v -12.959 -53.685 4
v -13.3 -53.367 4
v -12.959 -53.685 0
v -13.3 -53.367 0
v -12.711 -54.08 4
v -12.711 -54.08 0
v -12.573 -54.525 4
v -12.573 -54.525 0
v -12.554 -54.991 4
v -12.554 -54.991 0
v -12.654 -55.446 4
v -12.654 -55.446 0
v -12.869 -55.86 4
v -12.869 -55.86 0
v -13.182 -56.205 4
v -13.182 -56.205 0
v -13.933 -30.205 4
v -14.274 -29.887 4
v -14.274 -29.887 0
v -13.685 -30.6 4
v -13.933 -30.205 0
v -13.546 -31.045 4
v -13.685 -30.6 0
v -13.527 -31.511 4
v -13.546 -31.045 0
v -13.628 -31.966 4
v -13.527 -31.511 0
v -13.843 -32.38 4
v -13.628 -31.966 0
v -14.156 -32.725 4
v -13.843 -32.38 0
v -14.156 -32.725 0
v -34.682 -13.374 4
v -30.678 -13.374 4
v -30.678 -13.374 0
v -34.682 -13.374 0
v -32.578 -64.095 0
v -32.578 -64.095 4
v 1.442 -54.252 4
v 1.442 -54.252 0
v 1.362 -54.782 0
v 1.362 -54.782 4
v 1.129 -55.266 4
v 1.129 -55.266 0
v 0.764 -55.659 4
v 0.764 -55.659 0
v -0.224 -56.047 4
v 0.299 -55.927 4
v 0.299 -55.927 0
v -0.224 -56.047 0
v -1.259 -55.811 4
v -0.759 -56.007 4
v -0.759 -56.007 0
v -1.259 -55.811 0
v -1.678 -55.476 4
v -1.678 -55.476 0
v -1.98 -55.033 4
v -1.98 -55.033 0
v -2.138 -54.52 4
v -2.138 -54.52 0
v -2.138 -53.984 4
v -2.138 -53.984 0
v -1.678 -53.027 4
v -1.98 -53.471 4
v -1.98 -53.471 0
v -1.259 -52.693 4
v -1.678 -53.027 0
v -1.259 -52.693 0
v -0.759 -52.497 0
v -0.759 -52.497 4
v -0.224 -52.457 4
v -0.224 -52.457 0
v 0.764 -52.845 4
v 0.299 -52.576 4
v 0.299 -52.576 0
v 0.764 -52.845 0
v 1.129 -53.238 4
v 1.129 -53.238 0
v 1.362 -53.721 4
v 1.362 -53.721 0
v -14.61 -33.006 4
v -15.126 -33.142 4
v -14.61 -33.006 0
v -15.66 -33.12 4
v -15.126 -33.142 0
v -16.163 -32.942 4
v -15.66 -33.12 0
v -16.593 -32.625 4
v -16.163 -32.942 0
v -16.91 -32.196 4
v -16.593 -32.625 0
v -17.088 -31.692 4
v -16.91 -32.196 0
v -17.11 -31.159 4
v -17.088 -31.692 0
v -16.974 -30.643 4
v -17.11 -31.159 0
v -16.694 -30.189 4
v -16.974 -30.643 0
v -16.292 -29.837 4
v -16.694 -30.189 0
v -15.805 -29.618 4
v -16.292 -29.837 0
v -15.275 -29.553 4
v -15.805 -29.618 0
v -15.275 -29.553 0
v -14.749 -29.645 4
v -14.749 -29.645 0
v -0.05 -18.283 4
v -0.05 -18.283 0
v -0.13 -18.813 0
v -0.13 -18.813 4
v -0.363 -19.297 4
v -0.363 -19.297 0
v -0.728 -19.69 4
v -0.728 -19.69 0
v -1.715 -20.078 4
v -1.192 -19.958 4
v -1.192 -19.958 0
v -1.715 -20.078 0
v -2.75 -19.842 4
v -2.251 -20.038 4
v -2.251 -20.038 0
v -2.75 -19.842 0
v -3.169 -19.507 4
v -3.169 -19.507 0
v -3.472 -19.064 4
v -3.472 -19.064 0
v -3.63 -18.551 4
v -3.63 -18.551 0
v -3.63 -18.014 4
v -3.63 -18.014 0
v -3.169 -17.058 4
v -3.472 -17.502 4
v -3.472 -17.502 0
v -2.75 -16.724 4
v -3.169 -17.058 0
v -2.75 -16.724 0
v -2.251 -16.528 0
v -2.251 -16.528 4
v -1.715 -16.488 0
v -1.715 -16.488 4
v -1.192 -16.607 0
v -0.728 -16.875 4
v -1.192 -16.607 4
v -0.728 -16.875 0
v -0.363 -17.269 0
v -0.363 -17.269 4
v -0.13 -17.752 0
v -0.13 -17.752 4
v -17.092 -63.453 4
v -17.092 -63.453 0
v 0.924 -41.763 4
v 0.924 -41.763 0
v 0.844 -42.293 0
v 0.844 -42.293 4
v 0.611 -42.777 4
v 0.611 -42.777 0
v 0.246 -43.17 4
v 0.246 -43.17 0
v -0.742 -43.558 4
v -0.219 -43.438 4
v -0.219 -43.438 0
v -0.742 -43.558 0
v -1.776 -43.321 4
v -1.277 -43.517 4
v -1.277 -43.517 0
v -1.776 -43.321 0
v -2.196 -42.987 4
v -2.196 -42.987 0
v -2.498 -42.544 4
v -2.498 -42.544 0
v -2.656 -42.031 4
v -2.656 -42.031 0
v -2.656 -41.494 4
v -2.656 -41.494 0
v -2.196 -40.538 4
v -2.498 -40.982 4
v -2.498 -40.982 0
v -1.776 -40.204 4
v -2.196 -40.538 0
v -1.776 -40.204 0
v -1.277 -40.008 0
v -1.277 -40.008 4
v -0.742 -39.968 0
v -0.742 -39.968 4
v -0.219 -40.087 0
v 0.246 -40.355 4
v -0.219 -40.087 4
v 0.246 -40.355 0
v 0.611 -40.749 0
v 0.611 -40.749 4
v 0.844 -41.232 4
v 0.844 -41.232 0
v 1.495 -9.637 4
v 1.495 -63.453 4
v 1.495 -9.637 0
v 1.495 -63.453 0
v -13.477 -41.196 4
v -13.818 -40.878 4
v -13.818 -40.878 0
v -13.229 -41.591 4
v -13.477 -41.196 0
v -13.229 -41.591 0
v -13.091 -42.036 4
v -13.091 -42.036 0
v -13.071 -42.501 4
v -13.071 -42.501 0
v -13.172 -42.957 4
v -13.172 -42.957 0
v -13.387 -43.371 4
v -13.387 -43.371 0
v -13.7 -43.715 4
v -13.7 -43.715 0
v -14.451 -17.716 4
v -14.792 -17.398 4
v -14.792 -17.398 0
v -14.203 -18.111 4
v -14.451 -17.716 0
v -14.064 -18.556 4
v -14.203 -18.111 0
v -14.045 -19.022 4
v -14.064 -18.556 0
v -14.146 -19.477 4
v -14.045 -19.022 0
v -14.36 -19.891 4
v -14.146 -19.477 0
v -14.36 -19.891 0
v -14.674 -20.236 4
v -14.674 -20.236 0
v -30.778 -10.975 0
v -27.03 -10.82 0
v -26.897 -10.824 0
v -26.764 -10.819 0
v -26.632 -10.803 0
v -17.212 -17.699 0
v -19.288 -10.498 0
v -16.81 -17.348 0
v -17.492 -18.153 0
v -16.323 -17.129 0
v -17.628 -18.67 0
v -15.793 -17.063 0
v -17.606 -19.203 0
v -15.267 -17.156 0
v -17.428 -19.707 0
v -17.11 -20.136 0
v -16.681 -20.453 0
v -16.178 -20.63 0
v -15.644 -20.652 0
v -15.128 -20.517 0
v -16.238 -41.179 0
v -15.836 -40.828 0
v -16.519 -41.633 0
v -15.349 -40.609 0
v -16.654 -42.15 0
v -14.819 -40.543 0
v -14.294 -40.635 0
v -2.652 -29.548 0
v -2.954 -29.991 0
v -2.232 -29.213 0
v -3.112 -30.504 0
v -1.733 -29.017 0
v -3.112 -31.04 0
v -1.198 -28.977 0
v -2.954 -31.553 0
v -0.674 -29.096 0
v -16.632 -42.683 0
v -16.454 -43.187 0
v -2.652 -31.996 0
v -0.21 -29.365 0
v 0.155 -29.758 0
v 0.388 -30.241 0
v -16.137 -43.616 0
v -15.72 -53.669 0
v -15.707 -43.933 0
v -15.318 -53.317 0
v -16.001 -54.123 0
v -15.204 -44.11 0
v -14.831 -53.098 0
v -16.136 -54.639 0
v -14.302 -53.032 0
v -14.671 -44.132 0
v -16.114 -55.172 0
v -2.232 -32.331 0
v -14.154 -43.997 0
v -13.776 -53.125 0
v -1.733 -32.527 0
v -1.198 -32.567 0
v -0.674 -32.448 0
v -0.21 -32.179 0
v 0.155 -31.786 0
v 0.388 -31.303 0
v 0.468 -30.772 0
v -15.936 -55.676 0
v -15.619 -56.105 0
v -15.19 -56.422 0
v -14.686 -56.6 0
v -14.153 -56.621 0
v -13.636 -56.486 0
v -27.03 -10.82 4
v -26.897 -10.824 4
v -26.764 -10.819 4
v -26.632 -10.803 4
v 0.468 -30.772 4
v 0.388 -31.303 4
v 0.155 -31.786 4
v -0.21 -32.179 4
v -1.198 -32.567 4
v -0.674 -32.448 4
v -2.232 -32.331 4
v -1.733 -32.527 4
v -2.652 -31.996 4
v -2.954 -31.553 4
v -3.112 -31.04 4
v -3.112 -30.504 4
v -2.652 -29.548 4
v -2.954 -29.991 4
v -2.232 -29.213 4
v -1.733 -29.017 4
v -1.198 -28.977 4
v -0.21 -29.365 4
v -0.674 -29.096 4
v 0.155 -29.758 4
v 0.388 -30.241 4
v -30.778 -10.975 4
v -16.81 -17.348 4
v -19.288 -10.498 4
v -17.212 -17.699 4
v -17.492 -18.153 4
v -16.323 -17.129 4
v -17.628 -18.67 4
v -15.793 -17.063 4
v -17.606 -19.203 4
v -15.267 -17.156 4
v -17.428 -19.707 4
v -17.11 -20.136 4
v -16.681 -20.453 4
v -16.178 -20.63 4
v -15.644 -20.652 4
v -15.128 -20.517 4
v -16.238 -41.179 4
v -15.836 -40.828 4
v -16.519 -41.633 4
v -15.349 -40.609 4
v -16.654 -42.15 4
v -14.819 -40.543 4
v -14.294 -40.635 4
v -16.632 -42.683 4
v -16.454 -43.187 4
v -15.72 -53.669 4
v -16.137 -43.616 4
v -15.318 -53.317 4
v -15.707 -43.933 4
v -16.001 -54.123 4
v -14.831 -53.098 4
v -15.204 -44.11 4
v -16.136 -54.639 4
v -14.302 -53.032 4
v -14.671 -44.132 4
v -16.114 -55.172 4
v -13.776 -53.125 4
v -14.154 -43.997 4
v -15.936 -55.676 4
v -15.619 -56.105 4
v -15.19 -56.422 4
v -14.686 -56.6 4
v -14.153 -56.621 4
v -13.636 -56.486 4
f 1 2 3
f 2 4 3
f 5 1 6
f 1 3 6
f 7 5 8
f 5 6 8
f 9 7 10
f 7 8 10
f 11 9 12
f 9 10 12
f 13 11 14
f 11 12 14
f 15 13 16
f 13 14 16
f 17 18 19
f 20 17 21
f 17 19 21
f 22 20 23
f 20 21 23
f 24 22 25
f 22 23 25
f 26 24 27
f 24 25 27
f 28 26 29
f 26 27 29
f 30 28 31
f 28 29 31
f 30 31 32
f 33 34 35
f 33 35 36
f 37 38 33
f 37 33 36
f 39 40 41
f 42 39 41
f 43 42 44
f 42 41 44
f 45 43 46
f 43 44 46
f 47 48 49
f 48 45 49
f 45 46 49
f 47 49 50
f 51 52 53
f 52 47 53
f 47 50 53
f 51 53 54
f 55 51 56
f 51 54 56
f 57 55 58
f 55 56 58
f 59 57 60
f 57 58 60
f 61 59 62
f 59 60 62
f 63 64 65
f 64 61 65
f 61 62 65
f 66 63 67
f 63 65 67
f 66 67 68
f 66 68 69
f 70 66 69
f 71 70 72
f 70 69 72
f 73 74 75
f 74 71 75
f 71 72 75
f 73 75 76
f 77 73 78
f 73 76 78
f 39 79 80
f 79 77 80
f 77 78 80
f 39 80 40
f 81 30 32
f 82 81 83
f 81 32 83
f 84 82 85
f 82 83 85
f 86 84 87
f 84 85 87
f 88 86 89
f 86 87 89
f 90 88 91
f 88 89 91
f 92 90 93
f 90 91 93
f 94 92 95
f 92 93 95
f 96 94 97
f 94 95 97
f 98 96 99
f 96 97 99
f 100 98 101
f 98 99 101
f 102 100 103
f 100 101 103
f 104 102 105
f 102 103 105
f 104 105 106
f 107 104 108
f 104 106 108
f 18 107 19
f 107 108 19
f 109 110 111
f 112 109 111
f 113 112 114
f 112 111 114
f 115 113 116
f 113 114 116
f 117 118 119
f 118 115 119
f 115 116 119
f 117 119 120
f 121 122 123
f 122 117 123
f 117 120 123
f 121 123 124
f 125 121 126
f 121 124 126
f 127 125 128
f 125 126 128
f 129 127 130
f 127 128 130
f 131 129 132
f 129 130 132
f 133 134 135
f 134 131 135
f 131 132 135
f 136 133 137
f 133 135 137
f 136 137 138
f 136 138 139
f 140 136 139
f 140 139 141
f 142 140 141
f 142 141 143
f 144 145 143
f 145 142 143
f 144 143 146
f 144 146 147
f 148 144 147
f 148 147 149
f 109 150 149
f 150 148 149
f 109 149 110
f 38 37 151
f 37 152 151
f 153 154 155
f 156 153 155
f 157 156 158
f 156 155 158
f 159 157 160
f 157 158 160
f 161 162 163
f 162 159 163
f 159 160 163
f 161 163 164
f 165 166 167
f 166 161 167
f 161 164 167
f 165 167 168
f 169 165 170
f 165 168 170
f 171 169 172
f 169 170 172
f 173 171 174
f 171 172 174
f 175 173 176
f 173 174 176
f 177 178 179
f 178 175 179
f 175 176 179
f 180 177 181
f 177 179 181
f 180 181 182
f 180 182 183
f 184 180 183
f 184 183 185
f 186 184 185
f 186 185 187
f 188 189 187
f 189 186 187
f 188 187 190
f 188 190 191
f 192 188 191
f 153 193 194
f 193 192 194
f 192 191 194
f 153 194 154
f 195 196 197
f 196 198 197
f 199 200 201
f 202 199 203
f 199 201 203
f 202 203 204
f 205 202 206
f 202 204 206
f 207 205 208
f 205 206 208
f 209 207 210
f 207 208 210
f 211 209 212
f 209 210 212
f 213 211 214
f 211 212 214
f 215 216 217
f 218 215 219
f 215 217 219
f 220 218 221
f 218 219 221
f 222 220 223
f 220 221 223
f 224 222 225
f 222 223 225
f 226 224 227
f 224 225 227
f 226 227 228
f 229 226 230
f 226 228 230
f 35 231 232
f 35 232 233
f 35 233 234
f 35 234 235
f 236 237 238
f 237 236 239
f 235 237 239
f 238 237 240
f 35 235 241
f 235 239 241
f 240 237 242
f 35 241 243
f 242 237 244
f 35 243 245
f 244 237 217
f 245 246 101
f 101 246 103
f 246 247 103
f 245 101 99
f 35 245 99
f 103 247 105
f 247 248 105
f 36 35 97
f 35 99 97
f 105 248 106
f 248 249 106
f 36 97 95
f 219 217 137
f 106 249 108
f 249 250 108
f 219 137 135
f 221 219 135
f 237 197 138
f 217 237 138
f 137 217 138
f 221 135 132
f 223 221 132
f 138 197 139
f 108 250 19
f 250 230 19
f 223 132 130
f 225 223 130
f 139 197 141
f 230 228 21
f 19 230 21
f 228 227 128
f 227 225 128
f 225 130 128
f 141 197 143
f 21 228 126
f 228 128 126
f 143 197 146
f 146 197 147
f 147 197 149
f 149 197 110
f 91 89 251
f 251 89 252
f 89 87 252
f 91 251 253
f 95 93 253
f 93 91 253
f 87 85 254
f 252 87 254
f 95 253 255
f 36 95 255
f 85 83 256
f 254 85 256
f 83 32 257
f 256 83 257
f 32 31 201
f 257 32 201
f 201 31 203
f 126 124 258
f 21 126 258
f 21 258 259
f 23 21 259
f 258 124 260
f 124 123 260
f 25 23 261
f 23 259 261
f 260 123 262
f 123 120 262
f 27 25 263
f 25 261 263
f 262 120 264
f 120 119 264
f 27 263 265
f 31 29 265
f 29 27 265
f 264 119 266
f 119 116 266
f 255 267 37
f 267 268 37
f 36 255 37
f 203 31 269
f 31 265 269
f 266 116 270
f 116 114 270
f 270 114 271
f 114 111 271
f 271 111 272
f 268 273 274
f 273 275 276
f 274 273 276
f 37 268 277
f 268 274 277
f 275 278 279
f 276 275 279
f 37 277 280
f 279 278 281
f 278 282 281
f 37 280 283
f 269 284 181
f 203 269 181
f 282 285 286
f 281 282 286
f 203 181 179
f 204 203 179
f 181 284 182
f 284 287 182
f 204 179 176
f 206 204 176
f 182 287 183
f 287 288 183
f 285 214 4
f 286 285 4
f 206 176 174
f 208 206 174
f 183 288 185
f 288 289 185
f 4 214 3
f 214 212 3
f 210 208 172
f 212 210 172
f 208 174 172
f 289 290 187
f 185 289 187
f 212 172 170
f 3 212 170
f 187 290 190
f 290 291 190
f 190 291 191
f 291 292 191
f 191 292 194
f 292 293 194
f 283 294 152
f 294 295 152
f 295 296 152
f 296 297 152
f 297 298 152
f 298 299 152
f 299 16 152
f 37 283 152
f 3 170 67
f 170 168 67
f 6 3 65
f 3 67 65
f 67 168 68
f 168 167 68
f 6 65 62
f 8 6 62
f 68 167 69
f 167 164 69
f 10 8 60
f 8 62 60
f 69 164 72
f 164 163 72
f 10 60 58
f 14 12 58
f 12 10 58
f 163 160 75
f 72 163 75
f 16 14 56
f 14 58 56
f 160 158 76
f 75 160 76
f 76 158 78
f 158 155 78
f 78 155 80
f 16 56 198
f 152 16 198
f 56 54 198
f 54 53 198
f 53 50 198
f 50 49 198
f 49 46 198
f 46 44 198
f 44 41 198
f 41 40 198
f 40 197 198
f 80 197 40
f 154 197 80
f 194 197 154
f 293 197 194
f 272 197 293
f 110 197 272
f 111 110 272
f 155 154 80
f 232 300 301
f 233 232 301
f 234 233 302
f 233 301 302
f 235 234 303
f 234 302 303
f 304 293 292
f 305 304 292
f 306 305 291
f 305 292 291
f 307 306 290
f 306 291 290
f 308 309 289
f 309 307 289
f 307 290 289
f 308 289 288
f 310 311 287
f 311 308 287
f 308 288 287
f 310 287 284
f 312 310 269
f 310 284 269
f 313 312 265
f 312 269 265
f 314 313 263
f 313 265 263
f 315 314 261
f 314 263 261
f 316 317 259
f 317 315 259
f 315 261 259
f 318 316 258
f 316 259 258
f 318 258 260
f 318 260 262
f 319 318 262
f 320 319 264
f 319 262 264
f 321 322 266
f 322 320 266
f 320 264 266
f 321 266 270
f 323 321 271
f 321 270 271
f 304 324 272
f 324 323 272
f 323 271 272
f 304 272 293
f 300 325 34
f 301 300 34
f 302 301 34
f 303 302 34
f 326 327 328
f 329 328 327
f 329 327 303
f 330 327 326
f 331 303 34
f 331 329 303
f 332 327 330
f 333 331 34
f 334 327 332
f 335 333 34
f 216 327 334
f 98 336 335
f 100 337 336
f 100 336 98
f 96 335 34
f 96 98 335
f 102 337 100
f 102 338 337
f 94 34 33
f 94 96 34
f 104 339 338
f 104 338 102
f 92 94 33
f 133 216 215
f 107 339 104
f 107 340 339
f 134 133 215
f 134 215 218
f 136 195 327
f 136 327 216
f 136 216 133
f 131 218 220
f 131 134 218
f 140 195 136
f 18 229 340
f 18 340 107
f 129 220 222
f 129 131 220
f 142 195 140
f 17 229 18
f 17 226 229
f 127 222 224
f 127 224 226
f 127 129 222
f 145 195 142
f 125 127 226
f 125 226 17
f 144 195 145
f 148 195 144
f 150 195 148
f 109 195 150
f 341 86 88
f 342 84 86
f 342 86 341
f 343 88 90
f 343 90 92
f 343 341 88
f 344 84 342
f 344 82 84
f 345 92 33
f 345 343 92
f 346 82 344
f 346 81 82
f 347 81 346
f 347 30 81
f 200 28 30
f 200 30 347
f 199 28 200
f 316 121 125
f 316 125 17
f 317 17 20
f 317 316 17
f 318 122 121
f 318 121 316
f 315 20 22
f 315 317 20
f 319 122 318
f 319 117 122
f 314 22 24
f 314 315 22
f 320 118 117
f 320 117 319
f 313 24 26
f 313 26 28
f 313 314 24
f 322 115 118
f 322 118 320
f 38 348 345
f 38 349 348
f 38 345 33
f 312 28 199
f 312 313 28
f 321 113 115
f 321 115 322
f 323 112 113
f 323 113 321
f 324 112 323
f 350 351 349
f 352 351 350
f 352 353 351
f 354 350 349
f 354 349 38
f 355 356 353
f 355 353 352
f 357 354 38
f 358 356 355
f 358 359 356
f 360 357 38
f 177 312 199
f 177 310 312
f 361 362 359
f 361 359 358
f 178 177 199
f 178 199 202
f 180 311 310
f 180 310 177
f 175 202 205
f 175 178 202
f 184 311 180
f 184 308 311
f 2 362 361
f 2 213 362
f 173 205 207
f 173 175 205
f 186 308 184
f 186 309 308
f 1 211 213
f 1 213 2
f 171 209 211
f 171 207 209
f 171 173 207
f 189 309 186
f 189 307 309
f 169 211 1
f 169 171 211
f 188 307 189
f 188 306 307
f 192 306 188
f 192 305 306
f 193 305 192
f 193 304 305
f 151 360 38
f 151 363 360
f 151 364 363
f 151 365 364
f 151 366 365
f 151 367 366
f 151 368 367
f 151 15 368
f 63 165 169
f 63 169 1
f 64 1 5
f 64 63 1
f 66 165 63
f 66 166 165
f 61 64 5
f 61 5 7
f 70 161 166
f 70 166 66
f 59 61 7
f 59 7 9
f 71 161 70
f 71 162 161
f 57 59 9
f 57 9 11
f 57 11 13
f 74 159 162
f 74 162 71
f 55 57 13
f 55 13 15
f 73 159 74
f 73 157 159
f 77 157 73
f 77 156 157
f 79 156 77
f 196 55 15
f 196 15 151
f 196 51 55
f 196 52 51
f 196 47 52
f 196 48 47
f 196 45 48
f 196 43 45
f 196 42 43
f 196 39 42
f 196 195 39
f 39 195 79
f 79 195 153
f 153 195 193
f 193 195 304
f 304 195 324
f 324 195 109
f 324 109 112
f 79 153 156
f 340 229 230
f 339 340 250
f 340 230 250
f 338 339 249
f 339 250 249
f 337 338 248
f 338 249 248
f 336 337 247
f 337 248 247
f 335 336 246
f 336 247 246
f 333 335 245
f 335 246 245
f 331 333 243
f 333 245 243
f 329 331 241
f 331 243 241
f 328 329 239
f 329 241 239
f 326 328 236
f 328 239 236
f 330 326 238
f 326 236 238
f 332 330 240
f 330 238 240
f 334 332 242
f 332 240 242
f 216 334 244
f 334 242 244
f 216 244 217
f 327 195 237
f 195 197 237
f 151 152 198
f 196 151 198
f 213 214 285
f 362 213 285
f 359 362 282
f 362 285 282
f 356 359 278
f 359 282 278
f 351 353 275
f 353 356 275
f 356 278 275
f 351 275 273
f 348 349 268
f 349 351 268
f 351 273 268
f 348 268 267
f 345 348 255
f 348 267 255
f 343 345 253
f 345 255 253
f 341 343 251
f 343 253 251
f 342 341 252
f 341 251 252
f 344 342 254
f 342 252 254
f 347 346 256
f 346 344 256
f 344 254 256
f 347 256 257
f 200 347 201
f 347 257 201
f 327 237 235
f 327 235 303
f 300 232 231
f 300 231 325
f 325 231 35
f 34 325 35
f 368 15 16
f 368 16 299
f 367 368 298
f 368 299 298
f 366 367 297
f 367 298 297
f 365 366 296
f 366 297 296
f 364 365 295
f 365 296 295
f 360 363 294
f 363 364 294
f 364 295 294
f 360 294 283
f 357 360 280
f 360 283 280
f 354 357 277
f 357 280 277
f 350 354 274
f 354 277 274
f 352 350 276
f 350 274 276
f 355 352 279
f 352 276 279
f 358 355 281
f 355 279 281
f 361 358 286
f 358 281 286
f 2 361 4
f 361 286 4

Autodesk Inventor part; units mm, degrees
ref_plane "YZ Plane" through (0, 0, 0) normal (1, 0, 0) x (0, 1, 0)
ref_plane "XZ Plane" through (0, 0, 0) normal (0, 1, 0) x (-1, 0, 0)
ref_plane "XY Plane" through (0, 0, 0) normal (0, 0, 1) x (1, 0, 0)
sketch "Skizze1" plane through (0, 0, 0) normal (0, 0, 1) x (1, 0, 0)
  ellipse E0 centre (-12.1961, -42.2319) end of major axis (-9.6527, -42.1265) minor radius 1.8 (-13.7003, -43.7155) -> (-13.818, -40.878) ccw projected
  arc A0 (-13.818, -40.878) -> (-13.7003, -43.7155) centre (-14.8644, -42.3426) ccw projected
  ellipse E1 centre (-12.6519, -31.2414) end of major axis (-10.1085, -31.1359) minor radius 1.8 (-14.1561, -32.725) -> (-14.2737, -29.8874) ccw projected
  arc A1 (-14.2737, -29.8874) -> (-14.1561, -32.725) centre (-15.3201, -31.352) ccw projected
  ellipse E2 centre (-13.1697, -18.7521) end of major axis (-10.6263, -18.6467) minor radius 1.8 (-14.6739, -20.2357) -> (-14.7916, -17.3982) ccw projected
  arc A2 (-14.7916, -17.3982) -> (-14.6739, -20.2357) centre (-15.838, -18.8628) ccw projected
  ellipse E3 centre (-11.6782, -54.7212) end of major axis (-9.1348, -54.6157) minor radius 1.8 (-13.1824, -56.2048) -> (-13.3001, -53.3673) ccw projected
  arc A3 (-13.3001, -53.3673) -> (-13.1824, -56.2048) centre (-14.3465, -54.8319) ccw projected
  line L0 (1.4946, -9.6367) -> (3.6905, -62.5912) projected
  line L1 (1.4946, -9.6367) -> (-19.2875, -10.4985) projected
  line L2 (-19.2875, -10.4985) -> (-17.0916, -63.453) projected
  line L3 (-17.0916, -63.453) -> (3.6905, -62.5912) projected
  circle A4 centre (-0.8764, -41.7626) radius 1.8 projected
  circle A5 centre (-1.3321, -30.772) radius 1.8 projected
  circle A6 centre (-1.85, -18.2827) radius 1.8 projected
  circle A7 centre (-0.3585, -54.2518) radius 1.8 projected
  line L4 (1.4946, -9.6367) -> (-17.0916, -9.6367)
  line L5 (-17.0916, -9.6367) -> (-17.0916, -63.453)
  line L6 (-17.0916, -63.453) -> (1.4946, -63.453)
  line L7 (1.4946, -63.453) -> (1.4946, -9.6367)
  circle A8 centre (-0.3585, -54.2518) radius 1.8
  circle A9 centre (-0.8764, -41.7626) radius 1.8
  circle A10 centre (-1.3321, -30.772) radius 1.8
  circle A11 centre (-1.85, -18.2827) radius 1.8
  circle A12 centre (-15.838, -18.8628) radius 1.8
  circle A13 centre (-15.3201, -31.352) radius 1.8
  circle A14 centre (-14.8644, -42.3426) radius 1.8
  circle A15 centre (-14.3465, -54.8319) radius 1.8
  point P0 (0, 0)
extrude "Extrusion1" add sketch "Skizze1" along normal blind 4 contours A14 E0 | A13 E1 | E1 A1 L5 A2 E2 L1 L7 L3 | L5 L2 L1 A2 A1 | L3 L7 L6 | A12 E2 | A15 E3
sketch "Skizze2" plane through (1.4946, -9.6367, 0) normal (1, 0, 0) x (0, 0, 1)
  line L0 (0, 0.8618) -> (0, 53.8163) projected
  line L1 (0, 0.8618) -> (19, 0.8618)
  line L2 (19, 0.8618) -> (19, 53.8163)
  line L3 (19, 53.8163) -> (0, 53.8163)
  line L4 (0, 53.8163) -> (0, 0.8618)
  line L5 (4, 53.8163) -> (4, 0) projected
  point P0 (0, -9.6367)
  dimension "d3" = 15
extrude "Extrusion2" [suppressed]
sketch "Skizze3" plane through (-6.3, -26.5, 0) normal (1, 0, 0) x (0, 0, -1)
  line L0 (-7, 52) -> (-15, 52)
  line L1 (-15, 52) -> (-15, 35)
  line L2 (-15, 35) -> (-7, 35)
  line L3 (-7, 35) -> (-7, 52)
  line L4 (-4, 53) -> (-4, 0) projected
  line L5 (-19, 53) -> (-4, 53) projected
  circle A0 centre (-11, 31) radius 1.5
  point P0 (0, 26.5)
  dimension "d6" = 8
  dimension "d7" = 17
  dimension "d8" = 3
  dimension "d9" = 1
  dimension "d10" = 4
  dimension "d11" = 3
  dimension "d12" = 4
extrude "Extrusion3" [suppressed]
ref_plane "Arbeitsebene1" through (-1296.3098, -63.453, 4) normal (0.0207202, -0.9997853, 0) x (0, 0, 1)
mirror "Spiegeln1" [suppressed]
sketch "Skizze4" plane through (-19.2875, -10.4985, 0) normal (-0.9991413, -0.0414316, 0) x (0, 0, -1)
  line L0 (0, 0) -> (0, 53) projected
  line L1 (0, 53) -> (-4, 53) projected
  line L2 (-4, 0) -> (-4, 53) projected
  line L3 (0, 0) -> (-4, 0) projected
  point P0 (0, -9.6904)
extrude "Extrusion4" add sketch "Skizze4" along normal blind 15.5
sketch "Skizze5" plane through (0, 0, 4) normal (0, 0, 1) x (1, 0, 0)
  line L0 (-30.6781, -13.3745) -> (-38.5781, -13.3745)
  line L1 (-38.5781, -13.3745) -> (-39.6071, 11.4403)
  line L2 (-39.6071, 11.4403) -> (-31.7139, 11.6041)
  line L3 (-31.7139, 11.6041) -> (-30.6781, -13.3745)
  line L4 (-32.5783, -64.0952) -> (-34.7742, -11.1407) projected
  line L5 (-17.0916, -63.453) -> (-32.5783, -63.453) projected
  line L6 (1.4946, -9.6367) -> (-34.7742, -11.1407) projected
  circle A0 centre (-26.901, -9.1245) radius 1.7
  circle A1 centre (-28.2889, 24.3468) radius 1.7
  point P0 (0, 0)
  point P1 (-6.3, 26.5)
  point P2 (-6.3, -26.5)
  point P3 (1.4946, -9.6367)
  dimension "d26" = 7.9
  dimension "d27" = 25
  dimension "d28" = 14
  dimension "d29" = 53
  dimension "d30" = 3.95
  dimension "d31" = 3.95
  dimension "d32" = 33.5
  dimension "d33" = 3.4
  dimension "d34" = 3.4
  dimension "d35" = 4.25
  dimension "d41" = 4
extrude "Extrusion5" cut sketch "Skizze5" against normal blind 4
equation "\"d12\" = 0.5 * d6"
equation "\"d28\" = -0.5 * d27 + 0.5 * d29"
equation "\"d30\" = 0.5 * d26"
equation "\"d31\" = d30"
equation "\"d34\" = d33"
equation "\"d35\" = 0.5 * d32 - 0.5 * d27"
properties part number "cable_mount"
